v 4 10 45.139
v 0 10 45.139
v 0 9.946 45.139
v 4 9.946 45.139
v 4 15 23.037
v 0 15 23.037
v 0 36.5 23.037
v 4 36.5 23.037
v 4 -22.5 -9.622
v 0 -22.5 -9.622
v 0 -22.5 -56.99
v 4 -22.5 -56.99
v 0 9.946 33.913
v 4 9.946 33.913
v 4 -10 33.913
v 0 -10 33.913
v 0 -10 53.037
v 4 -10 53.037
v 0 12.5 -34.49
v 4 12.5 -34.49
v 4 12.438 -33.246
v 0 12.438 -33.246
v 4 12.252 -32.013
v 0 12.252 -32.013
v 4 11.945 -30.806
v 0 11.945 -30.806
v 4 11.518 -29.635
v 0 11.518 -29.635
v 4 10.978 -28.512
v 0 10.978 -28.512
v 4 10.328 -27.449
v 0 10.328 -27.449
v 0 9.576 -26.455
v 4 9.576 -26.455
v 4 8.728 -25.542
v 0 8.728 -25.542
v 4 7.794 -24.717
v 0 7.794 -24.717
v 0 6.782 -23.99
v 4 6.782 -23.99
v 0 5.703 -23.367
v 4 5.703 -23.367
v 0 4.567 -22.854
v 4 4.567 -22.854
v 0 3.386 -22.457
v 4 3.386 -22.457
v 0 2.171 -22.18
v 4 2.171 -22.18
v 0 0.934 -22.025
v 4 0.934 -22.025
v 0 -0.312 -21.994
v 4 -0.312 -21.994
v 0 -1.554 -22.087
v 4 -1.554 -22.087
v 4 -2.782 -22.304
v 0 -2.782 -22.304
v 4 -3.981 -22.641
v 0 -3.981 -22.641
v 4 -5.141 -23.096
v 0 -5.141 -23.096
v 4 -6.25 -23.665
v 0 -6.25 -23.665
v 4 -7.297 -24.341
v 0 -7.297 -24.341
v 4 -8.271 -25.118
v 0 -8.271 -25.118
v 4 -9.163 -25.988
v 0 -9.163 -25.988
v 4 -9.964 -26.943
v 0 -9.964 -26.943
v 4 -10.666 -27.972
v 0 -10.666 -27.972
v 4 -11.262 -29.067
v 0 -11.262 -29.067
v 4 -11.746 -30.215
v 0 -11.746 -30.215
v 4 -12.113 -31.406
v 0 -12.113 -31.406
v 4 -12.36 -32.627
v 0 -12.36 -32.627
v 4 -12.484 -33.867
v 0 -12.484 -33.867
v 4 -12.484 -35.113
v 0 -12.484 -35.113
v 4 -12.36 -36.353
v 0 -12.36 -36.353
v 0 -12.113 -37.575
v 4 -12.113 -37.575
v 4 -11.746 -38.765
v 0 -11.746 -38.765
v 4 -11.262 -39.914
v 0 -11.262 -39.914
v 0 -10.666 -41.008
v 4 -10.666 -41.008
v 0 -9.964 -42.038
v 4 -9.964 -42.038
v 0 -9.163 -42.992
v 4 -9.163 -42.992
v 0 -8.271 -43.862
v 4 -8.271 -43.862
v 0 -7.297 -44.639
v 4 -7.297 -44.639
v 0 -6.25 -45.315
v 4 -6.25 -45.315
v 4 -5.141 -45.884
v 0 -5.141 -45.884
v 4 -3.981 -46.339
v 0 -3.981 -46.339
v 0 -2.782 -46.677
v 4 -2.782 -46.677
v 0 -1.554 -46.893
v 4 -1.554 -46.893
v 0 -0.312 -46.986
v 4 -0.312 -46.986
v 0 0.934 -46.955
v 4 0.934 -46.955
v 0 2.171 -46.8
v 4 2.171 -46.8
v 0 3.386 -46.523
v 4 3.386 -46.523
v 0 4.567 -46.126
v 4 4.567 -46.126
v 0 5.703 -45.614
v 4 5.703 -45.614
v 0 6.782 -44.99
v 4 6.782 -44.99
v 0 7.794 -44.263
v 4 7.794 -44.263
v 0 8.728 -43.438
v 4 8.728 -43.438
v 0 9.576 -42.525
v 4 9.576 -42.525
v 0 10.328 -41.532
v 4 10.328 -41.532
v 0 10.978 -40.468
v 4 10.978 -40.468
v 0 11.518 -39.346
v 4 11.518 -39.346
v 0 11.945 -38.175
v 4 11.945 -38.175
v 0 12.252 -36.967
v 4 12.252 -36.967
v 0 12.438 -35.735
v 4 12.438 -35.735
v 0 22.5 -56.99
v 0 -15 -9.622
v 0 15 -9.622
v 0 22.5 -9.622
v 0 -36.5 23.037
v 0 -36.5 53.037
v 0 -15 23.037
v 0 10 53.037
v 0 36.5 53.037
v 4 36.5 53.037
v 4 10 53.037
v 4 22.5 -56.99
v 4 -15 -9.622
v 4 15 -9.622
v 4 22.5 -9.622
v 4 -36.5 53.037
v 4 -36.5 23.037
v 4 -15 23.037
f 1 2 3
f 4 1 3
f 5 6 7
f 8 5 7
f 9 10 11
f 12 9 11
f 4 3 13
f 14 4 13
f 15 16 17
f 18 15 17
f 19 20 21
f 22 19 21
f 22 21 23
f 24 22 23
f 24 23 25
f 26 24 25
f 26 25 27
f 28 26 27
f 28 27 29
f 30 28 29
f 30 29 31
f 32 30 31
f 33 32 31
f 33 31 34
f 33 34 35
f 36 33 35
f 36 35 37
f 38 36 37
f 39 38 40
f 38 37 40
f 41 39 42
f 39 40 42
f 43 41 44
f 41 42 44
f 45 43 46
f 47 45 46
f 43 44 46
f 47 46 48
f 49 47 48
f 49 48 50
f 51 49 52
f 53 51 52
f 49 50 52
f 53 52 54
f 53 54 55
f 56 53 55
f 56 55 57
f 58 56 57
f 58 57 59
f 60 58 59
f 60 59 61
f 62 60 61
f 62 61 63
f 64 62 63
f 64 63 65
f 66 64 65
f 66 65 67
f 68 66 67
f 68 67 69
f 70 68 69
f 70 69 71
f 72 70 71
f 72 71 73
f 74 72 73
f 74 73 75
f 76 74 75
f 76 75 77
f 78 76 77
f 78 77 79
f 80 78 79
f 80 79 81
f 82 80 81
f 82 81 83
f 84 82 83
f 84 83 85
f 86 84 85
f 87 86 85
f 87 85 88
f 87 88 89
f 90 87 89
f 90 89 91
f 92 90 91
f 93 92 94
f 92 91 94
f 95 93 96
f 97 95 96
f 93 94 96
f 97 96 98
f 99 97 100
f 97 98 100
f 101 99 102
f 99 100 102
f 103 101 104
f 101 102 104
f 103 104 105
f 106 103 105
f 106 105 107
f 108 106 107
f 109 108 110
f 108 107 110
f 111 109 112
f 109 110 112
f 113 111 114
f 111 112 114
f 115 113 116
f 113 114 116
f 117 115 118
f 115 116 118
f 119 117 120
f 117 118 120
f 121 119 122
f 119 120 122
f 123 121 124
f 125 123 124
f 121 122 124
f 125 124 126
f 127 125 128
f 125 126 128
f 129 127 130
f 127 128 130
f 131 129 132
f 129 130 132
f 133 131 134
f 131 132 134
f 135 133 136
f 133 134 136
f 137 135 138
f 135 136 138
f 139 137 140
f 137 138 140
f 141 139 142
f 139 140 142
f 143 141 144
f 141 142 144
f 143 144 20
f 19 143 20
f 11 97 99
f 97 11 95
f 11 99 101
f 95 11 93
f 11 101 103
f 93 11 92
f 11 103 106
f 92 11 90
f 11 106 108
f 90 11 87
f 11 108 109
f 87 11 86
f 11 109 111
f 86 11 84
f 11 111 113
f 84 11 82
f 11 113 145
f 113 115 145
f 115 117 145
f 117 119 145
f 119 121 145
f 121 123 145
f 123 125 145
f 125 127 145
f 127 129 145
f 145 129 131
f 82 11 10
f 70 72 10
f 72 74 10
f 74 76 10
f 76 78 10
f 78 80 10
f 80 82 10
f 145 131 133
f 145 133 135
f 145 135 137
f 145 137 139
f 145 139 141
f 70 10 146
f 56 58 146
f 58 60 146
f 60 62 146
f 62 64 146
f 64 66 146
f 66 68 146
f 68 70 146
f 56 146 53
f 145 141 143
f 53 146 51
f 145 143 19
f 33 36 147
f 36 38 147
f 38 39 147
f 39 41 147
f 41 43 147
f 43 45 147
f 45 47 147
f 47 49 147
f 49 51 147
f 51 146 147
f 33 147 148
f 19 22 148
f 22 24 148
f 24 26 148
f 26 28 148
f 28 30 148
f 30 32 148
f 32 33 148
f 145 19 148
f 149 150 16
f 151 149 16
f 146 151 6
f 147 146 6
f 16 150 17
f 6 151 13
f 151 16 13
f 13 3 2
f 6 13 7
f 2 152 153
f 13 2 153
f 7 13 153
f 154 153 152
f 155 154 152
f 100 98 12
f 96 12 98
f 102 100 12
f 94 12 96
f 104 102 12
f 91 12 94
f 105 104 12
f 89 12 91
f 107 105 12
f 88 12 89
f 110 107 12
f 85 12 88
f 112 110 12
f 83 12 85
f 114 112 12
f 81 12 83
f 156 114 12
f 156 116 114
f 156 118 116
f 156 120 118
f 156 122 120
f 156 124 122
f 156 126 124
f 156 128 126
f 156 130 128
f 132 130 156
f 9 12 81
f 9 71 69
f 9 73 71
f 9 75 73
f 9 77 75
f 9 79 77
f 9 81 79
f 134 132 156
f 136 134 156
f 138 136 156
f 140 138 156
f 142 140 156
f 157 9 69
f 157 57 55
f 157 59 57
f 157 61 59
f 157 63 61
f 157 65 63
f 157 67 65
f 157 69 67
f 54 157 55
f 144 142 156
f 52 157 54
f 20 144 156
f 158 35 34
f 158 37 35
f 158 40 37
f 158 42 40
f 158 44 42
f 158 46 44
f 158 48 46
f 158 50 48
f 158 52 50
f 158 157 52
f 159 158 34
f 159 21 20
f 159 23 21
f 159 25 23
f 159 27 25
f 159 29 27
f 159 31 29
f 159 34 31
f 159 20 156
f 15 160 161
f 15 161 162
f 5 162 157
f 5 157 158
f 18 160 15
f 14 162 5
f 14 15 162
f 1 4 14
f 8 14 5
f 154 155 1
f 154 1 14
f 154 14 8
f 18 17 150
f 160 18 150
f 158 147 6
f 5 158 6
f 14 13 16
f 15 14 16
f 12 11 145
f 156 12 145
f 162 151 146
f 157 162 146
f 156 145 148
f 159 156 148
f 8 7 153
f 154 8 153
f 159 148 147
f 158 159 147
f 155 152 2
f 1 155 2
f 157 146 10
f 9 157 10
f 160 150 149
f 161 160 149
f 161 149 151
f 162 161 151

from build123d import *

# Parameters (mm, degrees)
F1_DEPTH = 4
F2_R     = 12.5
F3_DEPTH = 25


with BuildPart() as f1:
    # F0 (on Right) → F1 (new body)
    with BuildSketch(Plane.YZ):
        Polygon((-10, 53.037333), (-36.5, 53.037333), (-36.5, 23.037333), (-15, 23.037333), (-15, 0), (-15, -9.621711), (-22.5, -9.621711), (-22.5, -56.990132), (0, -56.990132), (22.5, -56.990132), (22.5, -9.621711), (15, -9.621711), (15, 0), (15, 23.037333), (36.5, 23.037333), (36.5, 53.037333), (10, 53.037333), (10, 45.139179), (9.945652, 45.139179), (9.945652, 33.913046), (-10, 33.913046), (-10, 45.139179), align=None)
    extrude(amount=F1_DEPTH)

    # F2 (on face) → F3 (cut)
    with BuildSketch(Plane.YZ.offset(4)):
        with Locations((0, -34.490132)):
            Circle(F2_R)
    extrude(amount=-F3_DEPTH, mode=Mode.SUBTRACT)


solid = f1.part
